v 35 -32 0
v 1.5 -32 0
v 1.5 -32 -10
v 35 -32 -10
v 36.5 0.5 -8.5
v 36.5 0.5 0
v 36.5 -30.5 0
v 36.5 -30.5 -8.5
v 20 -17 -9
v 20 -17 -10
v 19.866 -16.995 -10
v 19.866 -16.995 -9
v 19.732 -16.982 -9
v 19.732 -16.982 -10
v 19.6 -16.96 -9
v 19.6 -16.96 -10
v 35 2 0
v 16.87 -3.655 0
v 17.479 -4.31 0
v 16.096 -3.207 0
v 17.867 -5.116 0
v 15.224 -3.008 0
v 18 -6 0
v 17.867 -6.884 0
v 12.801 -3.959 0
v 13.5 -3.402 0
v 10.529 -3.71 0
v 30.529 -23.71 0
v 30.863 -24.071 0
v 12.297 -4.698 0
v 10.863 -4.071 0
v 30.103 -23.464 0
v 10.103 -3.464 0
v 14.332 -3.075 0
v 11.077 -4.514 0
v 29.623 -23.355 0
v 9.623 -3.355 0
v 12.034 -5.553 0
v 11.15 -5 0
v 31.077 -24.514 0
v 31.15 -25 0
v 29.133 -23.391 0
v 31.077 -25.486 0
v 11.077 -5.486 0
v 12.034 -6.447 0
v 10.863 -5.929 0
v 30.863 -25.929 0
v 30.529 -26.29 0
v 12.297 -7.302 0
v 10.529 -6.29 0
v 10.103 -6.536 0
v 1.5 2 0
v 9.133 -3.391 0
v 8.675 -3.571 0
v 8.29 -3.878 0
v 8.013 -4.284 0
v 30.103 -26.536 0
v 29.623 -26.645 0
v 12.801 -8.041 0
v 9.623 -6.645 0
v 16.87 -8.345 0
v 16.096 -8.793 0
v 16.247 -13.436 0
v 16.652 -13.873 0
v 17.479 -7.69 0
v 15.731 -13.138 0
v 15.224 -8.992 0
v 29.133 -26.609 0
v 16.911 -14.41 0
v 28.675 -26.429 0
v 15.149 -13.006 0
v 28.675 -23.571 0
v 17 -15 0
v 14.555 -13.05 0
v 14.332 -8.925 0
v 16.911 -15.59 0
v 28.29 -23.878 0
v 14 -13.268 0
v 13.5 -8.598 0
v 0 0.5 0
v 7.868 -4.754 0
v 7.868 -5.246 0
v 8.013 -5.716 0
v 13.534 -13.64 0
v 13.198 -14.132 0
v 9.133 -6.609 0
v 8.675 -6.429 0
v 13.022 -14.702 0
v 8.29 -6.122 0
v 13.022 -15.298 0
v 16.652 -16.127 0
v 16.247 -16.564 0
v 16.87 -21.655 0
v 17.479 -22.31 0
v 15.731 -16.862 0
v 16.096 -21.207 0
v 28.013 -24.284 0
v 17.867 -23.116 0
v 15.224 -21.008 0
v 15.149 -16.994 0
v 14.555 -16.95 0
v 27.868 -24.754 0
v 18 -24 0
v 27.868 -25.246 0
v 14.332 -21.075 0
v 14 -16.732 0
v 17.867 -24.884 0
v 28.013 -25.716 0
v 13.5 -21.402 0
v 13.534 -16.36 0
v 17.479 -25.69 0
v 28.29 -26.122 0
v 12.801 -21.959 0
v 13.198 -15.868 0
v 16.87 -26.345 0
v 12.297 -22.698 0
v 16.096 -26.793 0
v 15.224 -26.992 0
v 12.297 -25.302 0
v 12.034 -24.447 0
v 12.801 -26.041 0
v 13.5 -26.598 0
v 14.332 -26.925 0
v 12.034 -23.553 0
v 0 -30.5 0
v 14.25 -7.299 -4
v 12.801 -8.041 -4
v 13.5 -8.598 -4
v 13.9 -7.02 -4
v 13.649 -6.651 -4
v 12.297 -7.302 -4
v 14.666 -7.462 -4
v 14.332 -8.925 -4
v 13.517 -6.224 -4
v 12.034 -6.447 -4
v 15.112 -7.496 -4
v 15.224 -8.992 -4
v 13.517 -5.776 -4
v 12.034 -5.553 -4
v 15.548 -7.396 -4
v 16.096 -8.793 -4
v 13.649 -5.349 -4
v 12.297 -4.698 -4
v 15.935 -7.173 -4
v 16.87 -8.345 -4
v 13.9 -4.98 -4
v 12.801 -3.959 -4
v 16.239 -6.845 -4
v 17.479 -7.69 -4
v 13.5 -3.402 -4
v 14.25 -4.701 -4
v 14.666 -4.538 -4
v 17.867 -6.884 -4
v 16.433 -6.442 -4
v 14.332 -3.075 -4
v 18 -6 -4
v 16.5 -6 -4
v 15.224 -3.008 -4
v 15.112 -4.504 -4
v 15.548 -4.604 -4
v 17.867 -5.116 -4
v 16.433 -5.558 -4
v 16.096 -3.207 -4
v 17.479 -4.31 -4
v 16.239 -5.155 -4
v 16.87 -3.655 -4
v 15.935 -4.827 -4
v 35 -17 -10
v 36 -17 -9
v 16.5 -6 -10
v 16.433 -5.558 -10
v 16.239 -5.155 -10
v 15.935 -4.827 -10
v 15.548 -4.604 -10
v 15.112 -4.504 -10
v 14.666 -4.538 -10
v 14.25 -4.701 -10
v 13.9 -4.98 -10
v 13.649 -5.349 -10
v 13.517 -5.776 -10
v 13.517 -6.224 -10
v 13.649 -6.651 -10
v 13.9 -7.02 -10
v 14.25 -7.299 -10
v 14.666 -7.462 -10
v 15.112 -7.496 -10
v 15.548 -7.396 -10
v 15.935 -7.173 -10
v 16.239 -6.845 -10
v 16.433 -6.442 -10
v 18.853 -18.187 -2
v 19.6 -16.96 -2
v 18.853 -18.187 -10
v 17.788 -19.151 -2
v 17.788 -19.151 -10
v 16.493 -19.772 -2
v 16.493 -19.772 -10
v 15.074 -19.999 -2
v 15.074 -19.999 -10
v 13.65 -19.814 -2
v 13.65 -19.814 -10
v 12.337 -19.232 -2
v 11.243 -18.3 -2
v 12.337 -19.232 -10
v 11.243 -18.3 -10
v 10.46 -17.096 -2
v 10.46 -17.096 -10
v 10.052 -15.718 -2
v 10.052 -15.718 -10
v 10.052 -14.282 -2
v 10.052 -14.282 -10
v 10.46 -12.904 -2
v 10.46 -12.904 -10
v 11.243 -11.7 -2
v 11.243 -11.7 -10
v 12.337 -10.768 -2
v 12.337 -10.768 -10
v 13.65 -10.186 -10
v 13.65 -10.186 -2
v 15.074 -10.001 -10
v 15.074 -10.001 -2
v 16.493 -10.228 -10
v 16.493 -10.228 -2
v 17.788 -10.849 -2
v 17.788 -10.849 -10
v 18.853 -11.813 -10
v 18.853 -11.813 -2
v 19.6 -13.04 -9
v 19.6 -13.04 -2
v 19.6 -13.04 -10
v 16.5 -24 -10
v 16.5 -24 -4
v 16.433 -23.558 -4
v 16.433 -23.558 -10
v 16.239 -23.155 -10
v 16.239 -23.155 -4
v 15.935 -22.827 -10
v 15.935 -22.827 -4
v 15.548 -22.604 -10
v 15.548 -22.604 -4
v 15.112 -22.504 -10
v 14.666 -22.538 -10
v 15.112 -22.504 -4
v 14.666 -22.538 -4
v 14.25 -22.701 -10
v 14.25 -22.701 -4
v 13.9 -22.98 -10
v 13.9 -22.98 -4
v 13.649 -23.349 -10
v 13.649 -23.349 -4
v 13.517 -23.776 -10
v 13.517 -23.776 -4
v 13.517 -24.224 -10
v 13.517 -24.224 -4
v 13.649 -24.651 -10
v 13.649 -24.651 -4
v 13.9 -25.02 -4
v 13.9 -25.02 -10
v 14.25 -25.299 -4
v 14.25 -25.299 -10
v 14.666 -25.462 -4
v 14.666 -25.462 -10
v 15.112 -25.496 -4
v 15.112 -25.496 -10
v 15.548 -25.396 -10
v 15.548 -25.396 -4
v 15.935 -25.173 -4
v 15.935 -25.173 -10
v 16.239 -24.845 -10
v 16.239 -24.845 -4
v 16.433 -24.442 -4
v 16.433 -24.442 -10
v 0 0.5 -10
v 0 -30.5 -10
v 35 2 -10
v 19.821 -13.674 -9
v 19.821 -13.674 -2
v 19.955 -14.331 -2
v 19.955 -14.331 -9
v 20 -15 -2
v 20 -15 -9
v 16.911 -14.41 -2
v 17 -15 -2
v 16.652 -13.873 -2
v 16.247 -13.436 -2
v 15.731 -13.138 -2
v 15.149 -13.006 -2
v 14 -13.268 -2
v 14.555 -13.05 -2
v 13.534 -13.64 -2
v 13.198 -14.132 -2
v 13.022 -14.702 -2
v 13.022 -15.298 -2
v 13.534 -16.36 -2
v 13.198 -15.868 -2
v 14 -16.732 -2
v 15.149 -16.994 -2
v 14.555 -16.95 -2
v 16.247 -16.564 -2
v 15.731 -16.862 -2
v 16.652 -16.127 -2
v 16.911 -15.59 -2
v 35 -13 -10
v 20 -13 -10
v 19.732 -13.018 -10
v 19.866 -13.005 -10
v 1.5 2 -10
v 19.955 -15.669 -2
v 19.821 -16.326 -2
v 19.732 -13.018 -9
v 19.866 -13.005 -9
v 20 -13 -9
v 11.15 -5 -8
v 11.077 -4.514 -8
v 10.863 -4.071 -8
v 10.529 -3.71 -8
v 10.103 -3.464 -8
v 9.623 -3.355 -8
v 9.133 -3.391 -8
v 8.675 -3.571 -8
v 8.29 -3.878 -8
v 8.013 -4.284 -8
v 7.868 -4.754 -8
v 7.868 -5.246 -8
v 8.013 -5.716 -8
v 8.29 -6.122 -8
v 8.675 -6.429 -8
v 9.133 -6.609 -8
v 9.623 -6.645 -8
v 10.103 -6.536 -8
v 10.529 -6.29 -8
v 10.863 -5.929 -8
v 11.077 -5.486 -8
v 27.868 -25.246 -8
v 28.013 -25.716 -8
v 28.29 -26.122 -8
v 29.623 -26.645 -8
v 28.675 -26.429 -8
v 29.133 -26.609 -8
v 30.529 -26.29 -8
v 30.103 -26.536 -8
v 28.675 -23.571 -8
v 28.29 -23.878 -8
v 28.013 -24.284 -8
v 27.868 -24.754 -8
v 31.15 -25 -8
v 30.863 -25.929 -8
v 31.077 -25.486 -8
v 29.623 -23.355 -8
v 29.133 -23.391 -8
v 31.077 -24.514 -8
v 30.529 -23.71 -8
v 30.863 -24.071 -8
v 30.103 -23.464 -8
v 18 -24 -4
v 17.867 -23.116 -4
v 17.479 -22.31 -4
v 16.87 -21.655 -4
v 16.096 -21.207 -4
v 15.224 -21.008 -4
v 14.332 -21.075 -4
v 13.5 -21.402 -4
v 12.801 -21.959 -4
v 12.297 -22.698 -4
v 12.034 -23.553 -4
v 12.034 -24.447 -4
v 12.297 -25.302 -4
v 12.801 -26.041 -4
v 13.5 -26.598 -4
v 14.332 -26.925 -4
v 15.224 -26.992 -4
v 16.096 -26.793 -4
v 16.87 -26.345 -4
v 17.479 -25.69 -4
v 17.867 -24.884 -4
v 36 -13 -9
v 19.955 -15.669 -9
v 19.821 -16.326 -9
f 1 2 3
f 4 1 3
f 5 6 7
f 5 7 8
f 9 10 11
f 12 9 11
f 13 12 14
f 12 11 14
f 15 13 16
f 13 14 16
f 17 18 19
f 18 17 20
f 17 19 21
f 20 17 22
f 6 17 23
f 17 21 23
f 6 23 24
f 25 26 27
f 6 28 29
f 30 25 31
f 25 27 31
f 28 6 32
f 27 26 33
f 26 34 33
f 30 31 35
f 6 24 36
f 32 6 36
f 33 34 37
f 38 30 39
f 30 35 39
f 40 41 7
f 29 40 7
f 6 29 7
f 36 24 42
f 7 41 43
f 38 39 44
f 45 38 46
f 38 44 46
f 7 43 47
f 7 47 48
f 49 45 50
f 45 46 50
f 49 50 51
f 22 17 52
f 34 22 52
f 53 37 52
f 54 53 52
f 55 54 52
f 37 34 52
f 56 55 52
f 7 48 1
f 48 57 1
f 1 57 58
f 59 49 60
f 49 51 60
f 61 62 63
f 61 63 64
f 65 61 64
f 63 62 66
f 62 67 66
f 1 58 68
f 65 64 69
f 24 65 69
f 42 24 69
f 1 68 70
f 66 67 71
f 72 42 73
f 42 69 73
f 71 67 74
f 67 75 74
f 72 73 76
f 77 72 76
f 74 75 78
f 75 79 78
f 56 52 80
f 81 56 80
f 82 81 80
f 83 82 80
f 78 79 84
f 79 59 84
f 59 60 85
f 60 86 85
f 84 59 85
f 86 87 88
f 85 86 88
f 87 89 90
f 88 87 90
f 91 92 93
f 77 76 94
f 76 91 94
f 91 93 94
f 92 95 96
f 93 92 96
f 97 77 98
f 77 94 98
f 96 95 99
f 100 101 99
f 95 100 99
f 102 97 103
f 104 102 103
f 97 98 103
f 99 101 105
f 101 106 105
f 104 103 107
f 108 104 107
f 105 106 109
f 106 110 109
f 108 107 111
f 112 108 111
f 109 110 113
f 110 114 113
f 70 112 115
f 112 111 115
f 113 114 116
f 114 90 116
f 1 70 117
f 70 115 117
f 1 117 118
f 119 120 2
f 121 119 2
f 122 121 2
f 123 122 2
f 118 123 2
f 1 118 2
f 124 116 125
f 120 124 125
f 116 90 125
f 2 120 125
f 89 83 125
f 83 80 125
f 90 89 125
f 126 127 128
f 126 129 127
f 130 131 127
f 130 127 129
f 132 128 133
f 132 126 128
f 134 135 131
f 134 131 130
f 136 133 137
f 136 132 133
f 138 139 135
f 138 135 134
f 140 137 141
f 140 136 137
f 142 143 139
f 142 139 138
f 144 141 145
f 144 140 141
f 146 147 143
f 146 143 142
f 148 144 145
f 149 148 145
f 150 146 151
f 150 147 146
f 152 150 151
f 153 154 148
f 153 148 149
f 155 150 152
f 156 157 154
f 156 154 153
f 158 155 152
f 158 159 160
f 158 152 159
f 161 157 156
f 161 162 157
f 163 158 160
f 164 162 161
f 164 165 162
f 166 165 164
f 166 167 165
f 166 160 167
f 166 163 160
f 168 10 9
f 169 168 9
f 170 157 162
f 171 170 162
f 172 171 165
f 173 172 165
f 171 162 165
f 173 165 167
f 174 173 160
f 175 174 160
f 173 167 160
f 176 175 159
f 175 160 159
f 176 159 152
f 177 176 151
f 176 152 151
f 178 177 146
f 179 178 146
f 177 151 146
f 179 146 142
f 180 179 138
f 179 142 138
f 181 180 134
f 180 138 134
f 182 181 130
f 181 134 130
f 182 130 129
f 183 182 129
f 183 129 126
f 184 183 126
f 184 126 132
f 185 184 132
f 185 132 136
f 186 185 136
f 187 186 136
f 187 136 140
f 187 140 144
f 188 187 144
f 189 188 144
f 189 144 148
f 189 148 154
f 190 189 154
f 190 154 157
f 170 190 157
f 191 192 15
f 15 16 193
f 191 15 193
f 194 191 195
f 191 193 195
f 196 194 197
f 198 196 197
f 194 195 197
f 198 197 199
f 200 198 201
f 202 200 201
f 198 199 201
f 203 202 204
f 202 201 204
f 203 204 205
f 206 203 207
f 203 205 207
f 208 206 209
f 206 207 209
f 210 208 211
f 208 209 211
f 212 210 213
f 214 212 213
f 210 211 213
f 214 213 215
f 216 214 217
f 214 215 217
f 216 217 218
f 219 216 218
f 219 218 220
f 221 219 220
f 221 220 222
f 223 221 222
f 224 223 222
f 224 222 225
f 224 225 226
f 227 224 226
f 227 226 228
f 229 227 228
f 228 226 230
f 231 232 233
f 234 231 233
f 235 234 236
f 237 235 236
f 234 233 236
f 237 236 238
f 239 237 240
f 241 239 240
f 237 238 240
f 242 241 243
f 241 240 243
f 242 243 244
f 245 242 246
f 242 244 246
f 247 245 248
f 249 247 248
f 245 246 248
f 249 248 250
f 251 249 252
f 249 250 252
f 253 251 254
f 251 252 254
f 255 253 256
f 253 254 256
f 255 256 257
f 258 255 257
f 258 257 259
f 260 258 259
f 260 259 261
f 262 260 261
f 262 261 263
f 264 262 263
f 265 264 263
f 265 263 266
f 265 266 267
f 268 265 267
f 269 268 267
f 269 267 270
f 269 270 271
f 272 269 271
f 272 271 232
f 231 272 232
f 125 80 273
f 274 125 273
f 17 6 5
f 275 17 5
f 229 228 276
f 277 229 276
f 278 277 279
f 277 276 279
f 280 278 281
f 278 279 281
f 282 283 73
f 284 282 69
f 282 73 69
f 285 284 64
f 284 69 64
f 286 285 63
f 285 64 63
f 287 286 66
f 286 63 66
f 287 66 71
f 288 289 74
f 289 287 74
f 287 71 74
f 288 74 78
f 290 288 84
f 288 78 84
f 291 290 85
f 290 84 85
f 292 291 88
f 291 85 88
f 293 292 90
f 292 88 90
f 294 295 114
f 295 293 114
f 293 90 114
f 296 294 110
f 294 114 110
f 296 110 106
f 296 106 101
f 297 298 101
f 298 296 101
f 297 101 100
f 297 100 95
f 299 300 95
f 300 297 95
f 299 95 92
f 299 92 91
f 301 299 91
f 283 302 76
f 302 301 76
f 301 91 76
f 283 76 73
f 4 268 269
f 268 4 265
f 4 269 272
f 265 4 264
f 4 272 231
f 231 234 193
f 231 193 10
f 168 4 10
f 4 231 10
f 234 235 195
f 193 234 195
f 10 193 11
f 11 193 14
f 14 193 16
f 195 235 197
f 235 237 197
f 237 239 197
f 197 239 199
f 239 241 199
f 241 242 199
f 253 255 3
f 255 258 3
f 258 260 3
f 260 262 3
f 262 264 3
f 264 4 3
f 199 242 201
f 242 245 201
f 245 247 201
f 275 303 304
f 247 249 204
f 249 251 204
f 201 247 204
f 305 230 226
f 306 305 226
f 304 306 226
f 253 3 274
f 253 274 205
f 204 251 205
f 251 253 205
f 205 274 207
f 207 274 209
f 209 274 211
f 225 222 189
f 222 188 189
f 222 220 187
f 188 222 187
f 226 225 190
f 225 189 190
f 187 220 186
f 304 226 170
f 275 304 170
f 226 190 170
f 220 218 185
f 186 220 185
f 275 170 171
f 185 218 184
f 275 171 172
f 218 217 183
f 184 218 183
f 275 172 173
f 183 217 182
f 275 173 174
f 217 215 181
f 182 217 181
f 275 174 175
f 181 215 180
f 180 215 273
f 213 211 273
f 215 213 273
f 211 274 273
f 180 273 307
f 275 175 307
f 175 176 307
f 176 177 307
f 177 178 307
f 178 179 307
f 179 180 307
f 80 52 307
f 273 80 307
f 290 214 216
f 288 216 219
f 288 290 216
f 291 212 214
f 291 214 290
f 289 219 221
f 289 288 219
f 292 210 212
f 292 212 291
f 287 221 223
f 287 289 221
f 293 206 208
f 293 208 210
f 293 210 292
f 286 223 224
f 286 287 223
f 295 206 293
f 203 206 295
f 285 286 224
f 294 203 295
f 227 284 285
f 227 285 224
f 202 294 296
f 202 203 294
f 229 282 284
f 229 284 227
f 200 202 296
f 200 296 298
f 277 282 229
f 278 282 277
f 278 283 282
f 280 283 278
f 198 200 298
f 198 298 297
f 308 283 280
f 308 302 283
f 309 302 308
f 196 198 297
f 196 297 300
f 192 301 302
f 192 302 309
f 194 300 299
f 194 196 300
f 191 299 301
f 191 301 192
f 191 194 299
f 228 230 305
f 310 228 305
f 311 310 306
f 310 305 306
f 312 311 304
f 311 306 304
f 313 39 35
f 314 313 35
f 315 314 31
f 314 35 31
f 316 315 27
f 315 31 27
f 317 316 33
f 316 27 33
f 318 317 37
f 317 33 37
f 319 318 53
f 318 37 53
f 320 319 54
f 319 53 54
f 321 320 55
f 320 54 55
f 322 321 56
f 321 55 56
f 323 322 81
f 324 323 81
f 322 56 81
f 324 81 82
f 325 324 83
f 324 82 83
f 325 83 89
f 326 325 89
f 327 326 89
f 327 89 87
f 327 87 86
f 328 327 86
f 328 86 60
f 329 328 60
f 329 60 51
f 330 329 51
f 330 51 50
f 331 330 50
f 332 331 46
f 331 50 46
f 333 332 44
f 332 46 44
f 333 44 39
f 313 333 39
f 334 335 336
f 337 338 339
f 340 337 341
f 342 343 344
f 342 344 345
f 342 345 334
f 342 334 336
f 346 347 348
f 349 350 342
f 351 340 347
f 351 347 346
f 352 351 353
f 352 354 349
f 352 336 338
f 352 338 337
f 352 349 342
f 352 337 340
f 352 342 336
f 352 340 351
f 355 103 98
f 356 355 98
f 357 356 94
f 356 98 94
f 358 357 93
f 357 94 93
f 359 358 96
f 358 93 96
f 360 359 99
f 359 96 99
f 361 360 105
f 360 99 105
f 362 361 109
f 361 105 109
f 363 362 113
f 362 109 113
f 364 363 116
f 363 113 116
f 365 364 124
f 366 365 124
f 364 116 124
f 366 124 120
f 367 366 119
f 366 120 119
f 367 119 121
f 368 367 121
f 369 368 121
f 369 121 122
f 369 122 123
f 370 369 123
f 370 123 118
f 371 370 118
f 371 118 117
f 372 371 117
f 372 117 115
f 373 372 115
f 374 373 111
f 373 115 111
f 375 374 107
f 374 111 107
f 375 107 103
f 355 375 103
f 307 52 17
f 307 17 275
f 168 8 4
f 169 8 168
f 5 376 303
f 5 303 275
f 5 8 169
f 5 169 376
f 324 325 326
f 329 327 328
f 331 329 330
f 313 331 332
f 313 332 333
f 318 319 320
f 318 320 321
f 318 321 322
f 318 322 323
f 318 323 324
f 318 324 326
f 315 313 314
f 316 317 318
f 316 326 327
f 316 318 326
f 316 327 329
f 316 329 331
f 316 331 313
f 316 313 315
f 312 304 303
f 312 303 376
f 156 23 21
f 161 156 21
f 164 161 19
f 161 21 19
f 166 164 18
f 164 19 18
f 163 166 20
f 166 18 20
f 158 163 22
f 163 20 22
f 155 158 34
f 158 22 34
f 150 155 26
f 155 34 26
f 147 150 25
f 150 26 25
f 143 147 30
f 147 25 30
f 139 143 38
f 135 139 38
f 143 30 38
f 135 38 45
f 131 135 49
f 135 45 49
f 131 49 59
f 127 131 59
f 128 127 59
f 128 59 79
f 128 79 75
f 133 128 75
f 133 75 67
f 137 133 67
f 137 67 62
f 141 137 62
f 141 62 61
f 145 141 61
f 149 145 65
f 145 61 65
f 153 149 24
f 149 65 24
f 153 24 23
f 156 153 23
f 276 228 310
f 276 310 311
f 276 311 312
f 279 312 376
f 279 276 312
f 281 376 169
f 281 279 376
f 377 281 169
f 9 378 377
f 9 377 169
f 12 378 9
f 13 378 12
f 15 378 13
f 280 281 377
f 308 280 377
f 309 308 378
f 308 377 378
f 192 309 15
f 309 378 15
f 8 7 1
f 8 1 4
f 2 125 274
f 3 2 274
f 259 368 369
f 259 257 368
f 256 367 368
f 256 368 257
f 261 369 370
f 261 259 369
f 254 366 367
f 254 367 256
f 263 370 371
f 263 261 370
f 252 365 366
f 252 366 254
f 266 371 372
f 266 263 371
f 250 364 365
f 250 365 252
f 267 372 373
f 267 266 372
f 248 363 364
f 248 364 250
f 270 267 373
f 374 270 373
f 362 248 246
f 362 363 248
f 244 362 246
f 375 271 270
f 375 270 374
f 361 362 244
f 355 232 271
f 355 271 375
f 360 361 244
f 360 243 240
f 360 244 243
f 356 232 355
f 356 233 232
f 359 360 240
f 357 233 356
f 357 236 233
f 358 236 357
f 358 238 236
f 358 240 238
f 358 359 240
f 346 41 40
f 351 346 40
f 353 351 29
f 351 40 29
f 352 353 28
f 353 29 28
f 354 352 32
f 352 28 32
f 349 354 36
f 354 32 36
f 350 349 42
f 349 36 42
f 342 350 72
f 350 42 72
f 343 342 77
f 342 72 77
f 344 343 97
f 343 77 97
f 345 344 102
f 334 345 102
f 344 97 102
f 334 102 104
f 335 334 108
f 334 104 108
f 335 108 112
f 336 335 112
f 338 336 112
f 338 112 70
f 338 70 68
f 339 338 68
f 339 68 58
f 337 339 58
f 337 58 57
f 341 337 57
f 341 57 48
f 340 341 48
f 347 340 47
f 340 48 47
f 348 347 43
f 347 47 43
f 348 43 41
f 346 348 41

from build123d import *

# Parameters (mm, degrees)
F0_W        = 30
F0_H        = 30
F0_R        = 3
F0_R_2      = 1.65
F0_R_3      = 2
F0_R_4      = 1.5
F1_DEPTH    = 10
F2_DEPTH    = 12
F3_DEPTH    = 4
F4_R        = 2
F5_DEPTH    = 8
F6_DEPTH    = 1
F7_DEPTH    = 4.5
F8_DEPTH    = 2
F9_DEPTH    = 2
F10_DEPTH   = 2
F11_C1_SIZE = 1.5
F11_C2_SIZE = 1.5
F11_C3_SIZE = 1.5
F11_C4_SIZE = 1.5
F11_C5_SIZE = 1.5
F12_R       = 1.65
F13_DEPTH   = 8


# Not quite as in the source:
# - a feature names something its author has since deleted; it is built from what else it names


with BuildPart() as f1:
    # F0 (on Top) → F1 (new body)
    with BuildSketch(Plane.XY):
        with Locations((15, -15)):
            Rectangle(F0_W, F0_H)
        with Locations((15, -24)):
            Circle(F0_R, mode=Mode.SUBTRACT)
        with Locations((6, -15)):
            Circle(F0_R, mode=Mode.SUBTRACT)
        with Locations((9.5, -5)):
            Circle(F0_R_2, mode=Mode.SUBTRACT)
        with Locations((15, -15)):
            Circle(F0_R_3, mode=Mode.SUBTRACT)
        with Locations((24, -15)):
            Circle(F0_R, mode=Mode.SUBTRACT)
        with Locations((15, -6)):
            Circle(F0_R, mode=Mode.SUBTRACT)
        with Locations((15, -6)):
            Circle(F0_R)
        with Locations((15, -6)):
            Circle(F0_R_4, mode=Mode.SUBTRACT)
        with Locations((15, -24)):
            Circle(F0_R)
        with Locations((15, -24)):
            Circle(F0_R_4, mode=Mode.SUBTRACT)
        with Locations((24, -15)):
            Circle(F0_R)
        with Locations((24, -15)):
            Circle(F0_R_4, mode=Mode.SUBTRACT)
        with Locations((6, -15)):
            Circle(F0_R)
        with Locations((6, -15)):
            Circle(F0_R_4, mode=Mode.SUBTRACT)
        with Locations((15, -15)):
            Circle(F0_R_3)
        with Locations((9.5, -5)):
            Circle(F0_R_2)
        with Locations((6, -15)):
            Circle(F0_R_4)
        with Locations((24, -15)):
            Circle(F0_R_4)
    extrude(amount=-F1_DEPTH)

    # F0 (on Top) → F2 (cut)
    with BuildSketch(Plane.XY):
        with Locations((15, -15)):
            Circle(F0_R_3)
    extrude(amount=-F2_DEPTH, mode=Mode.SUBTRACT)

    # F0 (on Top) → F3 (cut)
    with BuildSketch(Plane.XY):
        with Locations((15, -24)):
            Circle(F0_R)
        with Locations((15, -24)):
            Circle(F0_R_4, mode=Mode.SUBTRACT)
        with Locations((15, -6)):
            Circle(F0_R)
        with Locations((15, -6)):
            Circle(F0_R_4, mode=Mode.SUBTRACT)
    extrude(amount=-F3_DEPTH, mode=Mode.SUBTRACT)

    # F4 (on face) → F5 (cut)
    with BuildSketch(Plane(origin=(0, 0, -10), x_dir=(1, 0, 0), z_dir=(0, 0, -1))):
        with BuildLine():
            ThreePointArc((19.6, 13.0404082058), (18, 15), (19.6, 16.9595917942))
            ThreePointArc((19.6, 16.9595917942), (10, 15), (19.6, 13.0404082058))
        make_face()
        with Locations((15, 15)):
            Circle(F4_R, mode=Mode.SUBTRACT)
        with BuildLine():
            ThreePointArc((19.6, 13.0404082058), (19.8989794856, 14), (20, 15))
            ThreePointArc((20, 15), (19.8989794856, 16), (19.6, 16.9595917942))
            ThreePointArc((19.6, 16.9595917942), (18, 15), (19.6, 13.0404082058))
        make_face()
    extrude(amount=-F5_DEPTH, mode=Mode.SUBTRACT)

    # F4 (on face) → F6 (cut)
    with BuildSketch(Plane(origin=(0, 0, -10), x_dir=(1, 0, 0), z_dir=(0, 0, -1))):
        with BuildLine():
            ThreePointArc((19.6, 16.9595917942), (19.8989794856, 16), (20, 15))
            ThreePointArc((20, 15), (19.8989794856, 14), (19.6, 13.0404082058))
            ThreePointArc((19.6, 13.0404082058), (19.798982076, 13.010127694), (20, 13))
            Line((20, 13), (30, 13))
            Line((30, 13), (30, 17))
            Line((30, 17), (20, 17))
            ThreePointArc((20, 17), (19.798982076, 16.989872306), (19.6, 16.9595917942))
        make_face()
    extrude(amount=-F6_DEPTH, mode=Mode.SUBTRACT)

    # F7 (add): a face of the model
    f7_faces = [f1.faces().sort_by_distance(p)[0] for p in [
        (30, -15, -4.9391891892),
    ]]
    extrude(f7_faces, amount=F7_DEPTH)

    # F8 (add): a face of the model
    f8_faces = [f1.faces().sort_by_distance(p)[0] for p in [
        (17.25, 0, -5),
    ]]
    extrude(f8_faces, amount=F8_DEPTH)

    # F9 (add): a face of the model
    f9_faces = [f1.faces().sort_by_distance(p)[0] for p in [
        (17.25, -30, -5),
    ]]
    extrude(f9_faces, amount=F9_DEPTH)

    # F10 (add): a face of the model
    f10_faces = [f1.faces().sort_by_distance(p)[0] for p in [
        (34.5, -15, -4.9464285714),
    ]]
    extrude(f10_faces, amount=F10_DEPTH)

    # F11: chamfer of 1.5 on 6 edges, made by hand

    # F11_c1
    f11_c1_edges = [f1.edges().sort_by_distance(p)[0] for p in [
        (36.5, -5.5, -10),
    ]]
    chamfer(f11_c1_edges, length=F11_C1_SIZE)

    # F11_c2
    f11_c2_edges = [f1.edges().sort_by_distance(p)[0] for p in [
        (0, -32, -5),
    ]]
    chamfer(f11_c2_edges, length=F11_C2_SIZE)

    # F11_c3
    f11_c3_edges = [f1.edges().sort_by_distance(p)[0] for p in [
        (36.5, -32, -4.25),
    ]]
    chamfer(f11_c3_edges, length=F11_C3_SIZE)

    # F11_c4
    f11_c4_edges = [f1.edges().sort_by_distance(p)[0] for p in [
        (0, 2, -5),
    ]]
    chamfer(f11_c4_edges, length=F11_C4_SIZE)

    # F11_c5
    f11_c5_edges = [f1.edges().sort_by_distance(p)[0] for p in [
        (36.5, 2, -4.25),
    ]]
    chamfer(f11_c5_edges, length=F11_C5_SIZE)

    # F0 (on Top) + F12 (on face) → F13 (cut)
    with BuildSketch(Plane.XY):
        with Locations((9.5, -5)):
            Circle(F0_R_2)
    with BuildSketch(Plane.XY):
        with Locations((29.5, -25)):
            Circle(F12_R)
    extrude(amount=-F13_DEPTH, mode=Mode.SUBTRACT)


solid = f1.part
